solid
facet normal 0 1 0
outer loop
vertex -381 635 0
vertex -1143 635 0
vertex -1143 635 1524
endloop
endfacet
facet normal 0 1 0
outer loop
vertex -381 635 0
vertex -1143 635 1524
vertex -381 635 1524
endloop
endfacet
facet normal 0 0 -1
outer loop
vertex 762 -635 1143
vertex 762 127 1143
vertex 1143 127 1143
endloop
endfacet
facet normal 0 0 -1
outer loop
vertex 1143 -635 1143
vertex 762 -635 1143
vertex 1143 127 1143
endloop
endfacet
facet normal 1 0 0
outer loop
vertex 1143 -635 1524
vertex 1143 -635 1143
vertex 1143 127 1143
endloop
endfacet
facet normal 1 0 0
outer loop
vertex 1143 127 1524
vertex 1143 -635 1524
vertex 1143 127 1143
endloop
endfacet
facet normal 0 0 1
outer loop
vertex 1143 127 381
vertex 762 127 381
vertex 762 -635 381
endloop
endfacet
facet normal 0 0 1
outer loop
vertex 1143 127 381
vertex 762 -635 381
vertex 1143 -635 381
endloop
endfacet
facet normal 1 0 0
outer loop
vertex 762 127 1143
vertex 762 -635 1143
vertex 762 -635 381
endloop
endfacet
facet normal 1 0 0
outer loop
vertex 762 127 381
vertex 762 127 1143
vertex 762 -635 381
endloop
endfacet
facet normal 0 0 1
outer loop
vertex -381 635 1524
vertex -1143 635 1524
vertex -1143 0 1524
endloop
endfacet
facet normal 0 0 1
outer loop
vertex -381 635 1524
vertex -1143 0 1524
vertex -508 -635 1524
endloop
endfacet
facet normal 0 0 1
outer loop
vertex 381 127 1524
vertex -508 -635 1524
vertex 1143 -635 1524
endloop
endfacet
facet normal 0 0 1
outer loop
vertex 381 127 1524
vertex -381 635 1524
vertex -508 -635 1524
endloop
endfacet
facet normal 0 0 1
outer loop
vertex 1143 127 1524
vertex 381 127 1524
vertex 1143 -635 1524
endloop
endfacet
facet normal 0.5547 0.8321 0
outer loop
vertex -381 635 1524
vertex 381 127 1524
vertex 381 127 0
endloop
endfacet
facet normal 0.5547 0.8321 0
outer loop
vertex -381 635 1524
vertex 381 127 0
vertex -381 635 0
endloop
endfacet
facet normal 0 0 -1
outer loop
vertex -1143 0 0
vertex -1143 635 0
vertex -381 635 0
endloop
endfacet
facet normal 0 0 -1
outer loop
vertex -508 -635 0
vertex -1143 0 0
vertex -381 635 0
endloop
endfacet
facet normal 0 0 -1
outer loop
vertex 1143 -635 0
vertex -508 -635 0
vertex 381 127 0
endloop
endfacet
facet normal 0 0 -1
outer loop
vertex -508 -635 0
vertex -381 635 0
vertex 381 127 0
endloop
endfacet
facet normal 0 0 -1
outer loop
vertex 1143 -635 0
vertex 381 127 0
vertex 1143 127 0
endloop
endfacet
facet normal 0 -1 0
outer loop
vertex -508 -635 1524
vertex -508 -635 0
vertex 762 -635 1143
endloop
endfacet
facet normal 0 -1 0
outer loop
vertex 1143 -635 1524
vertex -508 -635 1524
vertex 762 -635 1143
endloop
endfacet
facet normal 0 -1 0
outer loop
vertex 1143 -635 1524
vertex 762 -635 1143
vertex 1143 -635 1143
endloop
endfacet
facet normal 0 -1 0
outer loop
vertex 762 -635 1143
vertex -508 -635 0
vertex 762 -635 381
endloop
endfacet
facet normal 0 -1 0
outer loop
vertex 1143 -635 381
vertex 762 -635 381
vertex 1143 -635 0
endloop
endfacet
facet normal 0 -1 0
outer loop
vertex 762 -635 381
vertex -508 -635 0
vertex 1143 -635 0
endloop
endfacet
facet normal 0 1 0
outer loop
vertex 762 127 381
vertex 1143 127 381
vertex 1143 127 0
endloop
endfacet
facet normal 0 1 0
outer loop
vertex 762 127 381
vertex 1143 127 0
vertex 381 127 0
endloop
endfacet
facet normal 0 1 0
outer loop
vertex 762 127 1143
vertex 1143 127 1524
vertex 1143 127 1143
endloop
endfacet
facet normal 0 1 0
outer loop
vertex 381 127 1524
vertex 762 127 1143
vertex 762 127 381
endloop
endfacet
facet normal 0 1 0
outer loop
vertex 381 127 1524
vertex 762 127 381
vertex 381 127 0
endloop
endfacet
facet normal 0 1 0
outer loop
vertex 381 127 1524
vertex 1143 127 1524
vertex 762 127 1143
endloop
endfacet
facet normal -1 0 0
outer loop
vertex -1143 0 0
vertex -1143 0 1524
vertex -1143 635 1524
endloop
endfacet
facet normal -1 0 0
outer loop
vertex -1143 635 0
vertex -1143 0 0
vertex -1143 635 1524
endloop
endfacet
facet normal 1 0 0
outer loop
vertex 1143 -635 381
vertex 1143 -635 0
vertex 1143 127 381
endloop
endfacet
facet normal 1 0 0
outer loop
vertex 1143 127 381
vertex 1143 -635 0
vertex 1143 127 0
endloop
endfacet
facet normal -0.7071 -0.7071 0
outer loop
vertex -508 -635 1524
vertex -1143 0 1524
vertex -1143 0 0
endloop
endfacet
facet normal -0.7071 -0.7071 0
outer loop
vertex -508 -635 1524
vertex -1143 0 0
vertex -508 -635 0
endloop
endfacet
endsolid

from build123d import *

# Parameters (mm, degrees)
SKETCH1_W           = 2286
SKETCH1_H           = 1270
BOSS_EXTRUDE1_DEPTH = 1524
CUT_EXTRUDE1_DEPTH  = 2009.046314207
CUT_EXTRUDE2_DEPTH  = 1524
SKETCH4_W           = 381
SKETCH4_H           = 762
CUT_EXTRUDE3_DEPTH  = 1524


with BuildPart() as part:
    # Sketch1 → Boss-Extrude1 (new body)
    with BuildSketch(Plane.XY):
        Rectangle(SKETCH1_W, SKETCH1_H)
    extrude(amount=BOSS_EXTRUDE1_DEPTH)

    # Sketch2 → Cut-Extrude1 (cut, through all)
    with BuildSketch(Plane.XY.offset(1524)):
        Polygon((-1143, 0), (-508, -635), (-1143, -635), align=None)
    extrude(amount=-CUT_EXTRUDE1_DEPTH, mode=Mode.SUBTRACT)

    # Sketch3 → Cut-Extrude2 (cut)
    with BuildSketch(Plane.XY.offset(1524)):
        Polygon((381, 127), (-381, 635), (381, 635), (1143, 635), (1143, 127), align=None)
    extrude(amount=-CUT_EXTRUDE2_DEPTH, mode=Mode.SUBTRACT)

    # Sketch4 → Cut-Extrude3 (cut)
    with BuildSketch(Plane(origin=(0, 127, 0), x_dir=(1, 0, 0), z_dir=(0, 1, 0))):
        with Locations((952.5, -762)):
            Rectangle(SKETCH4_W, SKETCH4_H)
    extrude(amount=-CUT_EXTRUDE3_DEPTH, mode=Mode.SUBTRACT)


solid = part.part
